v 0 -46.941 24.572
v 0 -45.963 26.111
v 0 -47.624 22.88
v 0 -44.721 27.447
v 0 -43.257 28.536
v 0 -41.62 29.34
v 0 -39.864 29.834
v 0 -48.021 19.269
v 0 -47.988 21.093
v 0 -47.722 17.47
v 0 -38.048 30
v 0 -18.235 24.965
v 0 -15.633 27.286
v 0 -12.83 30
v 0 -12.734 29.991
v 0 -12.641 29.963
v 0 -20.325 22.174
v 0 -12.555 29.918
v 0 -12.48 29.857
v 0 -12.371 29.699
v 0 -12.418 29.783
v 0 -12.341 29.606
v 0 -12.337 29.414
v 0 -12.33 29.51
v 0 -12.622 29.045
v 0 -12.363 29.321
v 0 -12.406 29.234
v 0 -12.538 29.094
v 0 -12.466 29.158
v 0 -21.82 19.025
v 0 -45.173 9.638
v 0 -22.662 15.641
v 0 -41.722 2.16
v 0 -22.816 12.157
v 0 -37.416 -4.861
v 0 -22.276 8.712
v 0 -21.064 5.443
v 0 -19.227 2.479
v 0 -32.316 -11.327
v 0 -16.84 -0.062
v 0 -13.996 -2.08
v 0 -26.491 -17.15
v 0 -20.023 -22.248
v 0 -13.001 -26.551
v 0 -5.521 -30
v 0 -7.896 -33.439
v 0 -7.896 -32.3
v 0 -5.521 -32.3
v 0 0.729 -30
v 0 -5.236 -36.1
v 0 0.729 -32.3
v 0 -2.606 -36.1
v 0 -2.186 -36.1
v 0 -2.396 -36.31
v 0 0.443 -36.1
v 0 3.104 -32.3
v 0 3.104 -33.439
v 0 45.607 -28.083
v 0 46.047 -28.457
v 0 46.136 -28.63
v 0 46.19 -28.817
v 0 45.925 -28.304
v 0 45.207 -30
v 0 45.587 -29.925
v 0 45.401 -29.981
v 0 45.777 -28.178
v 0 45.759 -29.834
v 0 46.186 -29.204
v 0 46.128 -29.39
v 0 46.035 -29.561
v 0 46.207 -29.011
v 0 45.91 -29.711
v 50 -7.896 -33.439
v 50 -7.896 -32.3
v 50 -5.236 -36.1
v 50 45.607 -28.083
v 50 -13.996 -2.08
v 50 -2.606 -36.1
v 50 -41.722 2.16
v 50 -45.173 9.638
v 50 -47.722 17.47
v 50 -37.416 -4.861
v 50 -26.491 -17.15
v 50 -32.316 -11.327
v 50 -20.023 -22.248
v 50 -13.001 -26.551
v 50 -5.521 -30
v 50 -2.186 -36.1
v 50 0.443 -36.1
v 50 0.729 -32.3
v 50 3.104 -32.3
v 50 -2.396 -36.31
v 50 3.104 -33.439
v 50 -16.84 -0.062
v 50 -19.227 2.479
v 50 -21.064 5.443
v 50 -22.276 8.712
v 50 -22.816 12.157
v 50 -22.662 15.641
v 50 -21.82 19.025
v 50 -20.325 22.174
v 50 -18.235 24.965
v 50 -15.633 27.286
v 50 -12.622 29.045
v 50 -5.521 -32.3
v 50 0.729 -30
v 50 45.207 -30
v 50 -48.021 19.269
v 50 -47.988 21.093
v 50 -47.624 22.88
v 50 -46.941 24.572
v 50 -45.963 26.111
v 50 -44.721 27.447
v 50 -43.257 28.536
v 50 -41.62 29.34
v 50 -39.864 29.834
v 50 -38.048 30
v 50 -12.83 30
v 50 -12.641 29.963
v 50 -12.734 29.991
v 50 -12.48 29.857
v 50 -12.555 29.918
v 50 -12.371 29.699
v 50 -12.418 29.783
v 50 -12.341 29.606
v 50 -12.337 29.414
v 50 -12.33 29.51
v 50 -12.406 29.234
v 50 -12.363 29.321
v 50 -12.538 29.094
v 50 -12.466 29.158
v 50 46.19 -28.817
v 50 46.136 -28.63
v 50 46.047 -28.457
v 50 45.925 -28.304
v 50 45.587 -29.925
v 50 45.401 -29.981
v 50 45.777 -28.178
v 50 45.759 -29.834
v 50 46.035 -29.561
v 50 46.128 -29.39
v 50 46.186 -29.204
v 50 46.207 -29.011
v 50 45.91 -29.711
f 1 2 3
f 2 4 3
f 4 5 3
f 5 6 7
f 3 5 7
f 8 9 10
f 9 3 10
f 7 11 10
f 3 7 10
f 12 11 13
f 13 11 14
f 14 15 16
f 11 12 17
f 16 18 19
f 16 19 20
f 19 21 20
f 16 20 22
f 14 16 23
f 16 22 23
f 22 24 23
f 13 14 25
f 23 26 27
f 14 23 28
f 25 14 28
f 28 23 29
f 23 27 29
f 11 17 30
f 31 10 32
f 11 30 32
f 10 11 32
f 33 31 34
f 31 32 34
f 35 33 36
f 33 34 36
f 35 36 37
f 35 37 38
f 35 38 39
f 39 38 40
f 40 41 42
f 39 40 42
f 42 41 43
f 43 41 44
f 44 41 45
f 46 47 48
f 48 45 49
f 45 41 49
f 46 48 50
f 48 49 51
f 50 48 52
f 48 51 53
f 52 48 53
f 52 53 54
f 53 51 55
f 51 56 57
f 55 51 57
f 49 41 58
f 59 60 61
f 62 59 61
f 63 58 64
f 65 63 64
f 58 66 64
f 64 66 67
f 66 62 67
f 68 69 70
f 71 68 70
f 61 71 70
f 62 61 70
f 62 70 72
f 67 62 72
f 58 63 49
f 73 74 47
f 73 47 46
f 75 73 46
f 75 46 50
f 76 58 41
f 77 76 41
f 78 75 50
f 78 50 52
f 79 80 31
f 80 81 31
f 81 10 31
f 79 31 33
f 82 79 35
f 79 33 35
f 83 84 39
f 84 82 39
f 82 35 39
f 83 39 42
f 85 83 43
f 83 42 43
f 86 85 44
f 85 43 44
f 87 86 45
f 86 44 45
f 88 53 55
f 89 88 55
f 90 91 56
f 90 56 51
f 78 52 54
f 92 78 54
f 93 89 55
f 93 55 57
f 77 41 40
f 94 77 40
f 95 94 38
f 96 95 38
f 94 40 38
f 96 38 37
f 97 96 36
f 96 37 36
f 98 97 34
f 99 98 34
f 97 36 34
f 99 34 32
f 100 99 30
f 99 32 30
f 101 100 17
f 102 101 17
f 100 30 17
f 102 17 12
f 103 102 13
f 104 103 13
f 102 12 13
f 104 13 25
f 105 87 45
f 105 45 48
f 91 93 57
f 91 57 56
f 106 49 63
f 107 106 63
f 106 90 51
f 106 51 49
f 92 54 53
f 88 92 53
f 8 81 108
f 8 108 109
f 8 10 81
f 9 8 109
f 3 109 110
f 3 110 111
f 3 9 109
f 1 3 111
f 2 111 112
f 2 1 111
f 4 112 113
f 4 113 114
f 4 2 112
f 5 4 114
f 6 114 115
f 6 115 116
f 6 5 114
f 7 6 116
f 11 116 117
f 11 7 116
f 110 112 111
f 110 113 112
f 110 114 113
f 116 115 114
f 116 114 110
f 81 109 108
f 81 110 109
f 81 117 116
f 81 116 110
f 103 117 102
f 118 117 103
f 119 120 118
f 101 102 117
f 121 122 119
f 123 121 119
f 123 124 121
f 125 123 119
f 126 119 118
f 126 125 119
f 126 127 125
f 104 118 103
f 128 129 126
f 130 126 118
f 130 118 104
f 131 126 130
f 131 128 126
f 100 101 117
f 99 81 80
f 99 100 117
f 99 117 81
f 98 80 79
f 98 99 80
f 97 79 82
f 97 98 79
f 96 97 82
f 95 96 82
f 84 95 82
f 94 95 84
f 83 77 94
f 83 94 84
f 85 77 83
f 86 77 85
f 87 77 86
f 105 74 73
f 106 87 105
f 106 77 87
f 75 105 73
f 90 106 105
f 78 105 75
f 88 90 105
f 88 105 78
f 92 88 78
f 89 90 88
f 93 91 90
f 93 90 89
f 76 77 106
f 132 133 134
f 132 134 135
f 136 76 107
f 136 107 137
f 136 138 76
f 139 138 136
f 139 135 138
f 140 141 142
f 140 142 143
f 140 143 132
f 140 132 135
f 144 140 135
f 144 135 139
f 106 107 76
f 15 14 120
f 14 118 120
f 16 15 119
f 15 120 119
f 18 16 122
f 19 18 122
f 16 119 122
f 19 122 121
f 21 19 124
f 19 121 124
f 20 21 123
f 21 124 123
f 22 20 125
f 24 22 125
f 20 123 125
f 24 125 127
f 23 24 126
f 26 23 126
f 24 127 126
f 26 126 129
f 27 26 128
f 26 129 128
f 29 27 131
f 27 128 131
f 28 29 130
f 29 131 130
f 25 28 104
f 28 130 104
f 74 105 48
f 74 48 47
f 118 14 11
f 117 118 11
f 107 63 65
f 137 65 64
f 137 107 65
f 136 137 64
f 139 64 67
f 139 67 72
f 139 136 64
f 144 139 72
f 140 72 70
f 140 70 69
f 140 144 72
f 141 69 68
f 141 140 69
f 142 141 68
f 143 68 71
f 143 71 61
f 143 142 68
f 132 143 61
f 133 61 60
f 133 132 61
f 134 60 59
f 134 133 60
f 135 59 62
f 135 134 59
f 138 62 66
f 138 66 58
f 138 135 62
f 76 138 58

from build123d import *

# Parameters (mm, degrees)
BOSS_EXTRUDE1_DEPTH = 50
FILLET1_R           = 1
FILLET2_R           = 0.5
BOSS_EXTRUDE2_DEPTH = 50
FILLET3_R           = 70
FILLET4_R           = 10


with BuildPart() as part:
    # Sketch1 → Boss-Extrude1 (new body)
    with BuildSketch(Plane(origin=(0, 0, 0), x_dir=(0, 0, -1), z_dir=(1, 0, 0))):
        with BuildLine():
            Line((-30, -50), (30, -50))
            Line((30, -50), (30, 50))
            Line((30, 50), (2.079852522, -13.995823026))
            ThreePointArc((2.079852522, -13.995823026), (-15.294169853, -22.708497617), (-30, -10))
            Line((-30, -10), (-30, -50))
        make_face()
    extrude(amount=BOSS_EXTRUDE1_DEPTH)

    # Fillet1
    fillet1_edges = [part.edges().sort_by_distance(p)[0] for p in [
        (25, 50, -30),
    ]]
    fillet(fillet1_edges, radius=FILLET1_R)

    # Fillet2
    fillet2_edges = [part.edges().sort_by_distance(p)[0] for p in [
        (25, -10, 30),
    ]]
    fillet(fillet2_edges, radius=FILLET2_R)

    # Sketch2 → Boss-Extrude2 (add)
    with BuildSketch(Plane(origin=(50, 0, 0), x_dir=(0, 0, -1), z_dir=(1, 0, 0))):
        Polygon((31.455, 0.728575996), (30, 0.728575996), (30, -5.521424004), (31.455, -5.521424004), (31.8, -5.521424004), (32.3, -5.521424004), (32.3, -7.896424004), (33.439339828, -7.896424004), (36.1, -5.235763833), (36.1, -2.606424004), (36.31, -2.396424004), (36.1, -2.186424004), (36.1, 0.442915824), (33.439339828, 3.103575996), (32.3, 3.103575996), (32.3, 0.728575996), (31.8, 0.728575996), align=None)
    extrude(amount=-BOSS_EXTRUDE2_DEPTH)

    # Fillet3
    # the kernel refuses this fillet: 70 mm, written as the material it takes off along each edge
    with BuildSketch(Plane(origin=(-162.95430565, -50, -30), x_dir=(0, 0, 1), z_dir=(1, 0, 0))) as fillet3_piece_1:
        with BuildLine():
            CenterArc((65.18172226, -70), FILLET3_R, 90, 68.617538212)
            Line((0, -44.478575996), (0, 0))
            Line((0, 0), (65.18172226, 0))
        make_face()
    extrude(amount=375.9086113, mode=Mode.SUBTRACT)

    # Fillet4
    fillet4_edges = [part.edges().sort_by_distance(p)[0] for p in [
        (25, -49.807949078, 30),
    ]]
    fillet(fillet4_edges, radius=FILLET4_R)


solid = part.part
